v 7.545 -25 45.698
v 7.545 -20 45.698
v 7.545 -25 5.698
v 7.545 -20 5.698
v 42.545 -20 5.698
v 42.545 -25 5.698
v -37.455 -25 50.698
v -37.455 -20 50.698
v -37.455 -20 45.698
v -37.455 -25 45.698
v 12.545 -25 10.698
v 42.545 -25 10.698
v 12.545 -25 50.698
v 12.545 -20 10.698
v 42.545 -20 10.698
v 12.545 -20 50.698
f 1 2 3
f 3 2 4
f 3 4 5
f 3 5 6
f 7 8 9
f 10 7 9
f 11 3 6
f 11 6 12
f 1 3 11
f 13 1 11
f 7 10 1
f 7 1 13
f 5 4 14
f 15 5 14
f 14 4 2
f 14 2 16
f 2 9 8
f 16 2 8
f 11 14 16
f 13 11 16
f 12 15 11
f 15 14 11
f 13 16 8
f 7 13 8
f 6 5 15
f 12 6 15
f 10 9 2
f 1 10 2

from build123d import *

# Parameters (mm, degrees)
F1_DEPTH = 25
F2_DEPTH = 20
F3_DEPTH = 15


with BuildPart() as f1:
    # F0 (on Front) → F1 (new body)
    with BuildSketch(Plane.XZ):
        Polygon((7.5449606204, 50.6978626826), (-37.4550393796, 50.6978626826), (-37.4550393796, 45.6978626826), (7.5449606204, 45.6978626826), (7.5449606204, 5.6978626826), (12.5449606204, 5.6978626826), (27.5449606204, 5.6978626826), (27.5449606204, 10.6978626826), (12.5449606204, 10.6978626826), (12.5449606204, 50.6978626826), align=None)
    extrude(amount=F1_DEPTH)

    # F2 (cut): a face of the model
    f2_faces = [f1.faces().sort_by_distance(p)[0] for p in [
        (-36.6644699645, 0, 48.1978626826),
    ]]
    extrude(f2_faces, amount=-F2_DEPTH, mode=Mode.SUBTRACT)

    # F3 (add): a face of the model
    f3_faces = [f1.faces().sort_by_distance(p)[0] for p in [
        (27.5449606204, -22.5, 8.1978626826),
    ]]
    extrude(f3_faces, amount=F3_DEPTH)


solid = f1.part
